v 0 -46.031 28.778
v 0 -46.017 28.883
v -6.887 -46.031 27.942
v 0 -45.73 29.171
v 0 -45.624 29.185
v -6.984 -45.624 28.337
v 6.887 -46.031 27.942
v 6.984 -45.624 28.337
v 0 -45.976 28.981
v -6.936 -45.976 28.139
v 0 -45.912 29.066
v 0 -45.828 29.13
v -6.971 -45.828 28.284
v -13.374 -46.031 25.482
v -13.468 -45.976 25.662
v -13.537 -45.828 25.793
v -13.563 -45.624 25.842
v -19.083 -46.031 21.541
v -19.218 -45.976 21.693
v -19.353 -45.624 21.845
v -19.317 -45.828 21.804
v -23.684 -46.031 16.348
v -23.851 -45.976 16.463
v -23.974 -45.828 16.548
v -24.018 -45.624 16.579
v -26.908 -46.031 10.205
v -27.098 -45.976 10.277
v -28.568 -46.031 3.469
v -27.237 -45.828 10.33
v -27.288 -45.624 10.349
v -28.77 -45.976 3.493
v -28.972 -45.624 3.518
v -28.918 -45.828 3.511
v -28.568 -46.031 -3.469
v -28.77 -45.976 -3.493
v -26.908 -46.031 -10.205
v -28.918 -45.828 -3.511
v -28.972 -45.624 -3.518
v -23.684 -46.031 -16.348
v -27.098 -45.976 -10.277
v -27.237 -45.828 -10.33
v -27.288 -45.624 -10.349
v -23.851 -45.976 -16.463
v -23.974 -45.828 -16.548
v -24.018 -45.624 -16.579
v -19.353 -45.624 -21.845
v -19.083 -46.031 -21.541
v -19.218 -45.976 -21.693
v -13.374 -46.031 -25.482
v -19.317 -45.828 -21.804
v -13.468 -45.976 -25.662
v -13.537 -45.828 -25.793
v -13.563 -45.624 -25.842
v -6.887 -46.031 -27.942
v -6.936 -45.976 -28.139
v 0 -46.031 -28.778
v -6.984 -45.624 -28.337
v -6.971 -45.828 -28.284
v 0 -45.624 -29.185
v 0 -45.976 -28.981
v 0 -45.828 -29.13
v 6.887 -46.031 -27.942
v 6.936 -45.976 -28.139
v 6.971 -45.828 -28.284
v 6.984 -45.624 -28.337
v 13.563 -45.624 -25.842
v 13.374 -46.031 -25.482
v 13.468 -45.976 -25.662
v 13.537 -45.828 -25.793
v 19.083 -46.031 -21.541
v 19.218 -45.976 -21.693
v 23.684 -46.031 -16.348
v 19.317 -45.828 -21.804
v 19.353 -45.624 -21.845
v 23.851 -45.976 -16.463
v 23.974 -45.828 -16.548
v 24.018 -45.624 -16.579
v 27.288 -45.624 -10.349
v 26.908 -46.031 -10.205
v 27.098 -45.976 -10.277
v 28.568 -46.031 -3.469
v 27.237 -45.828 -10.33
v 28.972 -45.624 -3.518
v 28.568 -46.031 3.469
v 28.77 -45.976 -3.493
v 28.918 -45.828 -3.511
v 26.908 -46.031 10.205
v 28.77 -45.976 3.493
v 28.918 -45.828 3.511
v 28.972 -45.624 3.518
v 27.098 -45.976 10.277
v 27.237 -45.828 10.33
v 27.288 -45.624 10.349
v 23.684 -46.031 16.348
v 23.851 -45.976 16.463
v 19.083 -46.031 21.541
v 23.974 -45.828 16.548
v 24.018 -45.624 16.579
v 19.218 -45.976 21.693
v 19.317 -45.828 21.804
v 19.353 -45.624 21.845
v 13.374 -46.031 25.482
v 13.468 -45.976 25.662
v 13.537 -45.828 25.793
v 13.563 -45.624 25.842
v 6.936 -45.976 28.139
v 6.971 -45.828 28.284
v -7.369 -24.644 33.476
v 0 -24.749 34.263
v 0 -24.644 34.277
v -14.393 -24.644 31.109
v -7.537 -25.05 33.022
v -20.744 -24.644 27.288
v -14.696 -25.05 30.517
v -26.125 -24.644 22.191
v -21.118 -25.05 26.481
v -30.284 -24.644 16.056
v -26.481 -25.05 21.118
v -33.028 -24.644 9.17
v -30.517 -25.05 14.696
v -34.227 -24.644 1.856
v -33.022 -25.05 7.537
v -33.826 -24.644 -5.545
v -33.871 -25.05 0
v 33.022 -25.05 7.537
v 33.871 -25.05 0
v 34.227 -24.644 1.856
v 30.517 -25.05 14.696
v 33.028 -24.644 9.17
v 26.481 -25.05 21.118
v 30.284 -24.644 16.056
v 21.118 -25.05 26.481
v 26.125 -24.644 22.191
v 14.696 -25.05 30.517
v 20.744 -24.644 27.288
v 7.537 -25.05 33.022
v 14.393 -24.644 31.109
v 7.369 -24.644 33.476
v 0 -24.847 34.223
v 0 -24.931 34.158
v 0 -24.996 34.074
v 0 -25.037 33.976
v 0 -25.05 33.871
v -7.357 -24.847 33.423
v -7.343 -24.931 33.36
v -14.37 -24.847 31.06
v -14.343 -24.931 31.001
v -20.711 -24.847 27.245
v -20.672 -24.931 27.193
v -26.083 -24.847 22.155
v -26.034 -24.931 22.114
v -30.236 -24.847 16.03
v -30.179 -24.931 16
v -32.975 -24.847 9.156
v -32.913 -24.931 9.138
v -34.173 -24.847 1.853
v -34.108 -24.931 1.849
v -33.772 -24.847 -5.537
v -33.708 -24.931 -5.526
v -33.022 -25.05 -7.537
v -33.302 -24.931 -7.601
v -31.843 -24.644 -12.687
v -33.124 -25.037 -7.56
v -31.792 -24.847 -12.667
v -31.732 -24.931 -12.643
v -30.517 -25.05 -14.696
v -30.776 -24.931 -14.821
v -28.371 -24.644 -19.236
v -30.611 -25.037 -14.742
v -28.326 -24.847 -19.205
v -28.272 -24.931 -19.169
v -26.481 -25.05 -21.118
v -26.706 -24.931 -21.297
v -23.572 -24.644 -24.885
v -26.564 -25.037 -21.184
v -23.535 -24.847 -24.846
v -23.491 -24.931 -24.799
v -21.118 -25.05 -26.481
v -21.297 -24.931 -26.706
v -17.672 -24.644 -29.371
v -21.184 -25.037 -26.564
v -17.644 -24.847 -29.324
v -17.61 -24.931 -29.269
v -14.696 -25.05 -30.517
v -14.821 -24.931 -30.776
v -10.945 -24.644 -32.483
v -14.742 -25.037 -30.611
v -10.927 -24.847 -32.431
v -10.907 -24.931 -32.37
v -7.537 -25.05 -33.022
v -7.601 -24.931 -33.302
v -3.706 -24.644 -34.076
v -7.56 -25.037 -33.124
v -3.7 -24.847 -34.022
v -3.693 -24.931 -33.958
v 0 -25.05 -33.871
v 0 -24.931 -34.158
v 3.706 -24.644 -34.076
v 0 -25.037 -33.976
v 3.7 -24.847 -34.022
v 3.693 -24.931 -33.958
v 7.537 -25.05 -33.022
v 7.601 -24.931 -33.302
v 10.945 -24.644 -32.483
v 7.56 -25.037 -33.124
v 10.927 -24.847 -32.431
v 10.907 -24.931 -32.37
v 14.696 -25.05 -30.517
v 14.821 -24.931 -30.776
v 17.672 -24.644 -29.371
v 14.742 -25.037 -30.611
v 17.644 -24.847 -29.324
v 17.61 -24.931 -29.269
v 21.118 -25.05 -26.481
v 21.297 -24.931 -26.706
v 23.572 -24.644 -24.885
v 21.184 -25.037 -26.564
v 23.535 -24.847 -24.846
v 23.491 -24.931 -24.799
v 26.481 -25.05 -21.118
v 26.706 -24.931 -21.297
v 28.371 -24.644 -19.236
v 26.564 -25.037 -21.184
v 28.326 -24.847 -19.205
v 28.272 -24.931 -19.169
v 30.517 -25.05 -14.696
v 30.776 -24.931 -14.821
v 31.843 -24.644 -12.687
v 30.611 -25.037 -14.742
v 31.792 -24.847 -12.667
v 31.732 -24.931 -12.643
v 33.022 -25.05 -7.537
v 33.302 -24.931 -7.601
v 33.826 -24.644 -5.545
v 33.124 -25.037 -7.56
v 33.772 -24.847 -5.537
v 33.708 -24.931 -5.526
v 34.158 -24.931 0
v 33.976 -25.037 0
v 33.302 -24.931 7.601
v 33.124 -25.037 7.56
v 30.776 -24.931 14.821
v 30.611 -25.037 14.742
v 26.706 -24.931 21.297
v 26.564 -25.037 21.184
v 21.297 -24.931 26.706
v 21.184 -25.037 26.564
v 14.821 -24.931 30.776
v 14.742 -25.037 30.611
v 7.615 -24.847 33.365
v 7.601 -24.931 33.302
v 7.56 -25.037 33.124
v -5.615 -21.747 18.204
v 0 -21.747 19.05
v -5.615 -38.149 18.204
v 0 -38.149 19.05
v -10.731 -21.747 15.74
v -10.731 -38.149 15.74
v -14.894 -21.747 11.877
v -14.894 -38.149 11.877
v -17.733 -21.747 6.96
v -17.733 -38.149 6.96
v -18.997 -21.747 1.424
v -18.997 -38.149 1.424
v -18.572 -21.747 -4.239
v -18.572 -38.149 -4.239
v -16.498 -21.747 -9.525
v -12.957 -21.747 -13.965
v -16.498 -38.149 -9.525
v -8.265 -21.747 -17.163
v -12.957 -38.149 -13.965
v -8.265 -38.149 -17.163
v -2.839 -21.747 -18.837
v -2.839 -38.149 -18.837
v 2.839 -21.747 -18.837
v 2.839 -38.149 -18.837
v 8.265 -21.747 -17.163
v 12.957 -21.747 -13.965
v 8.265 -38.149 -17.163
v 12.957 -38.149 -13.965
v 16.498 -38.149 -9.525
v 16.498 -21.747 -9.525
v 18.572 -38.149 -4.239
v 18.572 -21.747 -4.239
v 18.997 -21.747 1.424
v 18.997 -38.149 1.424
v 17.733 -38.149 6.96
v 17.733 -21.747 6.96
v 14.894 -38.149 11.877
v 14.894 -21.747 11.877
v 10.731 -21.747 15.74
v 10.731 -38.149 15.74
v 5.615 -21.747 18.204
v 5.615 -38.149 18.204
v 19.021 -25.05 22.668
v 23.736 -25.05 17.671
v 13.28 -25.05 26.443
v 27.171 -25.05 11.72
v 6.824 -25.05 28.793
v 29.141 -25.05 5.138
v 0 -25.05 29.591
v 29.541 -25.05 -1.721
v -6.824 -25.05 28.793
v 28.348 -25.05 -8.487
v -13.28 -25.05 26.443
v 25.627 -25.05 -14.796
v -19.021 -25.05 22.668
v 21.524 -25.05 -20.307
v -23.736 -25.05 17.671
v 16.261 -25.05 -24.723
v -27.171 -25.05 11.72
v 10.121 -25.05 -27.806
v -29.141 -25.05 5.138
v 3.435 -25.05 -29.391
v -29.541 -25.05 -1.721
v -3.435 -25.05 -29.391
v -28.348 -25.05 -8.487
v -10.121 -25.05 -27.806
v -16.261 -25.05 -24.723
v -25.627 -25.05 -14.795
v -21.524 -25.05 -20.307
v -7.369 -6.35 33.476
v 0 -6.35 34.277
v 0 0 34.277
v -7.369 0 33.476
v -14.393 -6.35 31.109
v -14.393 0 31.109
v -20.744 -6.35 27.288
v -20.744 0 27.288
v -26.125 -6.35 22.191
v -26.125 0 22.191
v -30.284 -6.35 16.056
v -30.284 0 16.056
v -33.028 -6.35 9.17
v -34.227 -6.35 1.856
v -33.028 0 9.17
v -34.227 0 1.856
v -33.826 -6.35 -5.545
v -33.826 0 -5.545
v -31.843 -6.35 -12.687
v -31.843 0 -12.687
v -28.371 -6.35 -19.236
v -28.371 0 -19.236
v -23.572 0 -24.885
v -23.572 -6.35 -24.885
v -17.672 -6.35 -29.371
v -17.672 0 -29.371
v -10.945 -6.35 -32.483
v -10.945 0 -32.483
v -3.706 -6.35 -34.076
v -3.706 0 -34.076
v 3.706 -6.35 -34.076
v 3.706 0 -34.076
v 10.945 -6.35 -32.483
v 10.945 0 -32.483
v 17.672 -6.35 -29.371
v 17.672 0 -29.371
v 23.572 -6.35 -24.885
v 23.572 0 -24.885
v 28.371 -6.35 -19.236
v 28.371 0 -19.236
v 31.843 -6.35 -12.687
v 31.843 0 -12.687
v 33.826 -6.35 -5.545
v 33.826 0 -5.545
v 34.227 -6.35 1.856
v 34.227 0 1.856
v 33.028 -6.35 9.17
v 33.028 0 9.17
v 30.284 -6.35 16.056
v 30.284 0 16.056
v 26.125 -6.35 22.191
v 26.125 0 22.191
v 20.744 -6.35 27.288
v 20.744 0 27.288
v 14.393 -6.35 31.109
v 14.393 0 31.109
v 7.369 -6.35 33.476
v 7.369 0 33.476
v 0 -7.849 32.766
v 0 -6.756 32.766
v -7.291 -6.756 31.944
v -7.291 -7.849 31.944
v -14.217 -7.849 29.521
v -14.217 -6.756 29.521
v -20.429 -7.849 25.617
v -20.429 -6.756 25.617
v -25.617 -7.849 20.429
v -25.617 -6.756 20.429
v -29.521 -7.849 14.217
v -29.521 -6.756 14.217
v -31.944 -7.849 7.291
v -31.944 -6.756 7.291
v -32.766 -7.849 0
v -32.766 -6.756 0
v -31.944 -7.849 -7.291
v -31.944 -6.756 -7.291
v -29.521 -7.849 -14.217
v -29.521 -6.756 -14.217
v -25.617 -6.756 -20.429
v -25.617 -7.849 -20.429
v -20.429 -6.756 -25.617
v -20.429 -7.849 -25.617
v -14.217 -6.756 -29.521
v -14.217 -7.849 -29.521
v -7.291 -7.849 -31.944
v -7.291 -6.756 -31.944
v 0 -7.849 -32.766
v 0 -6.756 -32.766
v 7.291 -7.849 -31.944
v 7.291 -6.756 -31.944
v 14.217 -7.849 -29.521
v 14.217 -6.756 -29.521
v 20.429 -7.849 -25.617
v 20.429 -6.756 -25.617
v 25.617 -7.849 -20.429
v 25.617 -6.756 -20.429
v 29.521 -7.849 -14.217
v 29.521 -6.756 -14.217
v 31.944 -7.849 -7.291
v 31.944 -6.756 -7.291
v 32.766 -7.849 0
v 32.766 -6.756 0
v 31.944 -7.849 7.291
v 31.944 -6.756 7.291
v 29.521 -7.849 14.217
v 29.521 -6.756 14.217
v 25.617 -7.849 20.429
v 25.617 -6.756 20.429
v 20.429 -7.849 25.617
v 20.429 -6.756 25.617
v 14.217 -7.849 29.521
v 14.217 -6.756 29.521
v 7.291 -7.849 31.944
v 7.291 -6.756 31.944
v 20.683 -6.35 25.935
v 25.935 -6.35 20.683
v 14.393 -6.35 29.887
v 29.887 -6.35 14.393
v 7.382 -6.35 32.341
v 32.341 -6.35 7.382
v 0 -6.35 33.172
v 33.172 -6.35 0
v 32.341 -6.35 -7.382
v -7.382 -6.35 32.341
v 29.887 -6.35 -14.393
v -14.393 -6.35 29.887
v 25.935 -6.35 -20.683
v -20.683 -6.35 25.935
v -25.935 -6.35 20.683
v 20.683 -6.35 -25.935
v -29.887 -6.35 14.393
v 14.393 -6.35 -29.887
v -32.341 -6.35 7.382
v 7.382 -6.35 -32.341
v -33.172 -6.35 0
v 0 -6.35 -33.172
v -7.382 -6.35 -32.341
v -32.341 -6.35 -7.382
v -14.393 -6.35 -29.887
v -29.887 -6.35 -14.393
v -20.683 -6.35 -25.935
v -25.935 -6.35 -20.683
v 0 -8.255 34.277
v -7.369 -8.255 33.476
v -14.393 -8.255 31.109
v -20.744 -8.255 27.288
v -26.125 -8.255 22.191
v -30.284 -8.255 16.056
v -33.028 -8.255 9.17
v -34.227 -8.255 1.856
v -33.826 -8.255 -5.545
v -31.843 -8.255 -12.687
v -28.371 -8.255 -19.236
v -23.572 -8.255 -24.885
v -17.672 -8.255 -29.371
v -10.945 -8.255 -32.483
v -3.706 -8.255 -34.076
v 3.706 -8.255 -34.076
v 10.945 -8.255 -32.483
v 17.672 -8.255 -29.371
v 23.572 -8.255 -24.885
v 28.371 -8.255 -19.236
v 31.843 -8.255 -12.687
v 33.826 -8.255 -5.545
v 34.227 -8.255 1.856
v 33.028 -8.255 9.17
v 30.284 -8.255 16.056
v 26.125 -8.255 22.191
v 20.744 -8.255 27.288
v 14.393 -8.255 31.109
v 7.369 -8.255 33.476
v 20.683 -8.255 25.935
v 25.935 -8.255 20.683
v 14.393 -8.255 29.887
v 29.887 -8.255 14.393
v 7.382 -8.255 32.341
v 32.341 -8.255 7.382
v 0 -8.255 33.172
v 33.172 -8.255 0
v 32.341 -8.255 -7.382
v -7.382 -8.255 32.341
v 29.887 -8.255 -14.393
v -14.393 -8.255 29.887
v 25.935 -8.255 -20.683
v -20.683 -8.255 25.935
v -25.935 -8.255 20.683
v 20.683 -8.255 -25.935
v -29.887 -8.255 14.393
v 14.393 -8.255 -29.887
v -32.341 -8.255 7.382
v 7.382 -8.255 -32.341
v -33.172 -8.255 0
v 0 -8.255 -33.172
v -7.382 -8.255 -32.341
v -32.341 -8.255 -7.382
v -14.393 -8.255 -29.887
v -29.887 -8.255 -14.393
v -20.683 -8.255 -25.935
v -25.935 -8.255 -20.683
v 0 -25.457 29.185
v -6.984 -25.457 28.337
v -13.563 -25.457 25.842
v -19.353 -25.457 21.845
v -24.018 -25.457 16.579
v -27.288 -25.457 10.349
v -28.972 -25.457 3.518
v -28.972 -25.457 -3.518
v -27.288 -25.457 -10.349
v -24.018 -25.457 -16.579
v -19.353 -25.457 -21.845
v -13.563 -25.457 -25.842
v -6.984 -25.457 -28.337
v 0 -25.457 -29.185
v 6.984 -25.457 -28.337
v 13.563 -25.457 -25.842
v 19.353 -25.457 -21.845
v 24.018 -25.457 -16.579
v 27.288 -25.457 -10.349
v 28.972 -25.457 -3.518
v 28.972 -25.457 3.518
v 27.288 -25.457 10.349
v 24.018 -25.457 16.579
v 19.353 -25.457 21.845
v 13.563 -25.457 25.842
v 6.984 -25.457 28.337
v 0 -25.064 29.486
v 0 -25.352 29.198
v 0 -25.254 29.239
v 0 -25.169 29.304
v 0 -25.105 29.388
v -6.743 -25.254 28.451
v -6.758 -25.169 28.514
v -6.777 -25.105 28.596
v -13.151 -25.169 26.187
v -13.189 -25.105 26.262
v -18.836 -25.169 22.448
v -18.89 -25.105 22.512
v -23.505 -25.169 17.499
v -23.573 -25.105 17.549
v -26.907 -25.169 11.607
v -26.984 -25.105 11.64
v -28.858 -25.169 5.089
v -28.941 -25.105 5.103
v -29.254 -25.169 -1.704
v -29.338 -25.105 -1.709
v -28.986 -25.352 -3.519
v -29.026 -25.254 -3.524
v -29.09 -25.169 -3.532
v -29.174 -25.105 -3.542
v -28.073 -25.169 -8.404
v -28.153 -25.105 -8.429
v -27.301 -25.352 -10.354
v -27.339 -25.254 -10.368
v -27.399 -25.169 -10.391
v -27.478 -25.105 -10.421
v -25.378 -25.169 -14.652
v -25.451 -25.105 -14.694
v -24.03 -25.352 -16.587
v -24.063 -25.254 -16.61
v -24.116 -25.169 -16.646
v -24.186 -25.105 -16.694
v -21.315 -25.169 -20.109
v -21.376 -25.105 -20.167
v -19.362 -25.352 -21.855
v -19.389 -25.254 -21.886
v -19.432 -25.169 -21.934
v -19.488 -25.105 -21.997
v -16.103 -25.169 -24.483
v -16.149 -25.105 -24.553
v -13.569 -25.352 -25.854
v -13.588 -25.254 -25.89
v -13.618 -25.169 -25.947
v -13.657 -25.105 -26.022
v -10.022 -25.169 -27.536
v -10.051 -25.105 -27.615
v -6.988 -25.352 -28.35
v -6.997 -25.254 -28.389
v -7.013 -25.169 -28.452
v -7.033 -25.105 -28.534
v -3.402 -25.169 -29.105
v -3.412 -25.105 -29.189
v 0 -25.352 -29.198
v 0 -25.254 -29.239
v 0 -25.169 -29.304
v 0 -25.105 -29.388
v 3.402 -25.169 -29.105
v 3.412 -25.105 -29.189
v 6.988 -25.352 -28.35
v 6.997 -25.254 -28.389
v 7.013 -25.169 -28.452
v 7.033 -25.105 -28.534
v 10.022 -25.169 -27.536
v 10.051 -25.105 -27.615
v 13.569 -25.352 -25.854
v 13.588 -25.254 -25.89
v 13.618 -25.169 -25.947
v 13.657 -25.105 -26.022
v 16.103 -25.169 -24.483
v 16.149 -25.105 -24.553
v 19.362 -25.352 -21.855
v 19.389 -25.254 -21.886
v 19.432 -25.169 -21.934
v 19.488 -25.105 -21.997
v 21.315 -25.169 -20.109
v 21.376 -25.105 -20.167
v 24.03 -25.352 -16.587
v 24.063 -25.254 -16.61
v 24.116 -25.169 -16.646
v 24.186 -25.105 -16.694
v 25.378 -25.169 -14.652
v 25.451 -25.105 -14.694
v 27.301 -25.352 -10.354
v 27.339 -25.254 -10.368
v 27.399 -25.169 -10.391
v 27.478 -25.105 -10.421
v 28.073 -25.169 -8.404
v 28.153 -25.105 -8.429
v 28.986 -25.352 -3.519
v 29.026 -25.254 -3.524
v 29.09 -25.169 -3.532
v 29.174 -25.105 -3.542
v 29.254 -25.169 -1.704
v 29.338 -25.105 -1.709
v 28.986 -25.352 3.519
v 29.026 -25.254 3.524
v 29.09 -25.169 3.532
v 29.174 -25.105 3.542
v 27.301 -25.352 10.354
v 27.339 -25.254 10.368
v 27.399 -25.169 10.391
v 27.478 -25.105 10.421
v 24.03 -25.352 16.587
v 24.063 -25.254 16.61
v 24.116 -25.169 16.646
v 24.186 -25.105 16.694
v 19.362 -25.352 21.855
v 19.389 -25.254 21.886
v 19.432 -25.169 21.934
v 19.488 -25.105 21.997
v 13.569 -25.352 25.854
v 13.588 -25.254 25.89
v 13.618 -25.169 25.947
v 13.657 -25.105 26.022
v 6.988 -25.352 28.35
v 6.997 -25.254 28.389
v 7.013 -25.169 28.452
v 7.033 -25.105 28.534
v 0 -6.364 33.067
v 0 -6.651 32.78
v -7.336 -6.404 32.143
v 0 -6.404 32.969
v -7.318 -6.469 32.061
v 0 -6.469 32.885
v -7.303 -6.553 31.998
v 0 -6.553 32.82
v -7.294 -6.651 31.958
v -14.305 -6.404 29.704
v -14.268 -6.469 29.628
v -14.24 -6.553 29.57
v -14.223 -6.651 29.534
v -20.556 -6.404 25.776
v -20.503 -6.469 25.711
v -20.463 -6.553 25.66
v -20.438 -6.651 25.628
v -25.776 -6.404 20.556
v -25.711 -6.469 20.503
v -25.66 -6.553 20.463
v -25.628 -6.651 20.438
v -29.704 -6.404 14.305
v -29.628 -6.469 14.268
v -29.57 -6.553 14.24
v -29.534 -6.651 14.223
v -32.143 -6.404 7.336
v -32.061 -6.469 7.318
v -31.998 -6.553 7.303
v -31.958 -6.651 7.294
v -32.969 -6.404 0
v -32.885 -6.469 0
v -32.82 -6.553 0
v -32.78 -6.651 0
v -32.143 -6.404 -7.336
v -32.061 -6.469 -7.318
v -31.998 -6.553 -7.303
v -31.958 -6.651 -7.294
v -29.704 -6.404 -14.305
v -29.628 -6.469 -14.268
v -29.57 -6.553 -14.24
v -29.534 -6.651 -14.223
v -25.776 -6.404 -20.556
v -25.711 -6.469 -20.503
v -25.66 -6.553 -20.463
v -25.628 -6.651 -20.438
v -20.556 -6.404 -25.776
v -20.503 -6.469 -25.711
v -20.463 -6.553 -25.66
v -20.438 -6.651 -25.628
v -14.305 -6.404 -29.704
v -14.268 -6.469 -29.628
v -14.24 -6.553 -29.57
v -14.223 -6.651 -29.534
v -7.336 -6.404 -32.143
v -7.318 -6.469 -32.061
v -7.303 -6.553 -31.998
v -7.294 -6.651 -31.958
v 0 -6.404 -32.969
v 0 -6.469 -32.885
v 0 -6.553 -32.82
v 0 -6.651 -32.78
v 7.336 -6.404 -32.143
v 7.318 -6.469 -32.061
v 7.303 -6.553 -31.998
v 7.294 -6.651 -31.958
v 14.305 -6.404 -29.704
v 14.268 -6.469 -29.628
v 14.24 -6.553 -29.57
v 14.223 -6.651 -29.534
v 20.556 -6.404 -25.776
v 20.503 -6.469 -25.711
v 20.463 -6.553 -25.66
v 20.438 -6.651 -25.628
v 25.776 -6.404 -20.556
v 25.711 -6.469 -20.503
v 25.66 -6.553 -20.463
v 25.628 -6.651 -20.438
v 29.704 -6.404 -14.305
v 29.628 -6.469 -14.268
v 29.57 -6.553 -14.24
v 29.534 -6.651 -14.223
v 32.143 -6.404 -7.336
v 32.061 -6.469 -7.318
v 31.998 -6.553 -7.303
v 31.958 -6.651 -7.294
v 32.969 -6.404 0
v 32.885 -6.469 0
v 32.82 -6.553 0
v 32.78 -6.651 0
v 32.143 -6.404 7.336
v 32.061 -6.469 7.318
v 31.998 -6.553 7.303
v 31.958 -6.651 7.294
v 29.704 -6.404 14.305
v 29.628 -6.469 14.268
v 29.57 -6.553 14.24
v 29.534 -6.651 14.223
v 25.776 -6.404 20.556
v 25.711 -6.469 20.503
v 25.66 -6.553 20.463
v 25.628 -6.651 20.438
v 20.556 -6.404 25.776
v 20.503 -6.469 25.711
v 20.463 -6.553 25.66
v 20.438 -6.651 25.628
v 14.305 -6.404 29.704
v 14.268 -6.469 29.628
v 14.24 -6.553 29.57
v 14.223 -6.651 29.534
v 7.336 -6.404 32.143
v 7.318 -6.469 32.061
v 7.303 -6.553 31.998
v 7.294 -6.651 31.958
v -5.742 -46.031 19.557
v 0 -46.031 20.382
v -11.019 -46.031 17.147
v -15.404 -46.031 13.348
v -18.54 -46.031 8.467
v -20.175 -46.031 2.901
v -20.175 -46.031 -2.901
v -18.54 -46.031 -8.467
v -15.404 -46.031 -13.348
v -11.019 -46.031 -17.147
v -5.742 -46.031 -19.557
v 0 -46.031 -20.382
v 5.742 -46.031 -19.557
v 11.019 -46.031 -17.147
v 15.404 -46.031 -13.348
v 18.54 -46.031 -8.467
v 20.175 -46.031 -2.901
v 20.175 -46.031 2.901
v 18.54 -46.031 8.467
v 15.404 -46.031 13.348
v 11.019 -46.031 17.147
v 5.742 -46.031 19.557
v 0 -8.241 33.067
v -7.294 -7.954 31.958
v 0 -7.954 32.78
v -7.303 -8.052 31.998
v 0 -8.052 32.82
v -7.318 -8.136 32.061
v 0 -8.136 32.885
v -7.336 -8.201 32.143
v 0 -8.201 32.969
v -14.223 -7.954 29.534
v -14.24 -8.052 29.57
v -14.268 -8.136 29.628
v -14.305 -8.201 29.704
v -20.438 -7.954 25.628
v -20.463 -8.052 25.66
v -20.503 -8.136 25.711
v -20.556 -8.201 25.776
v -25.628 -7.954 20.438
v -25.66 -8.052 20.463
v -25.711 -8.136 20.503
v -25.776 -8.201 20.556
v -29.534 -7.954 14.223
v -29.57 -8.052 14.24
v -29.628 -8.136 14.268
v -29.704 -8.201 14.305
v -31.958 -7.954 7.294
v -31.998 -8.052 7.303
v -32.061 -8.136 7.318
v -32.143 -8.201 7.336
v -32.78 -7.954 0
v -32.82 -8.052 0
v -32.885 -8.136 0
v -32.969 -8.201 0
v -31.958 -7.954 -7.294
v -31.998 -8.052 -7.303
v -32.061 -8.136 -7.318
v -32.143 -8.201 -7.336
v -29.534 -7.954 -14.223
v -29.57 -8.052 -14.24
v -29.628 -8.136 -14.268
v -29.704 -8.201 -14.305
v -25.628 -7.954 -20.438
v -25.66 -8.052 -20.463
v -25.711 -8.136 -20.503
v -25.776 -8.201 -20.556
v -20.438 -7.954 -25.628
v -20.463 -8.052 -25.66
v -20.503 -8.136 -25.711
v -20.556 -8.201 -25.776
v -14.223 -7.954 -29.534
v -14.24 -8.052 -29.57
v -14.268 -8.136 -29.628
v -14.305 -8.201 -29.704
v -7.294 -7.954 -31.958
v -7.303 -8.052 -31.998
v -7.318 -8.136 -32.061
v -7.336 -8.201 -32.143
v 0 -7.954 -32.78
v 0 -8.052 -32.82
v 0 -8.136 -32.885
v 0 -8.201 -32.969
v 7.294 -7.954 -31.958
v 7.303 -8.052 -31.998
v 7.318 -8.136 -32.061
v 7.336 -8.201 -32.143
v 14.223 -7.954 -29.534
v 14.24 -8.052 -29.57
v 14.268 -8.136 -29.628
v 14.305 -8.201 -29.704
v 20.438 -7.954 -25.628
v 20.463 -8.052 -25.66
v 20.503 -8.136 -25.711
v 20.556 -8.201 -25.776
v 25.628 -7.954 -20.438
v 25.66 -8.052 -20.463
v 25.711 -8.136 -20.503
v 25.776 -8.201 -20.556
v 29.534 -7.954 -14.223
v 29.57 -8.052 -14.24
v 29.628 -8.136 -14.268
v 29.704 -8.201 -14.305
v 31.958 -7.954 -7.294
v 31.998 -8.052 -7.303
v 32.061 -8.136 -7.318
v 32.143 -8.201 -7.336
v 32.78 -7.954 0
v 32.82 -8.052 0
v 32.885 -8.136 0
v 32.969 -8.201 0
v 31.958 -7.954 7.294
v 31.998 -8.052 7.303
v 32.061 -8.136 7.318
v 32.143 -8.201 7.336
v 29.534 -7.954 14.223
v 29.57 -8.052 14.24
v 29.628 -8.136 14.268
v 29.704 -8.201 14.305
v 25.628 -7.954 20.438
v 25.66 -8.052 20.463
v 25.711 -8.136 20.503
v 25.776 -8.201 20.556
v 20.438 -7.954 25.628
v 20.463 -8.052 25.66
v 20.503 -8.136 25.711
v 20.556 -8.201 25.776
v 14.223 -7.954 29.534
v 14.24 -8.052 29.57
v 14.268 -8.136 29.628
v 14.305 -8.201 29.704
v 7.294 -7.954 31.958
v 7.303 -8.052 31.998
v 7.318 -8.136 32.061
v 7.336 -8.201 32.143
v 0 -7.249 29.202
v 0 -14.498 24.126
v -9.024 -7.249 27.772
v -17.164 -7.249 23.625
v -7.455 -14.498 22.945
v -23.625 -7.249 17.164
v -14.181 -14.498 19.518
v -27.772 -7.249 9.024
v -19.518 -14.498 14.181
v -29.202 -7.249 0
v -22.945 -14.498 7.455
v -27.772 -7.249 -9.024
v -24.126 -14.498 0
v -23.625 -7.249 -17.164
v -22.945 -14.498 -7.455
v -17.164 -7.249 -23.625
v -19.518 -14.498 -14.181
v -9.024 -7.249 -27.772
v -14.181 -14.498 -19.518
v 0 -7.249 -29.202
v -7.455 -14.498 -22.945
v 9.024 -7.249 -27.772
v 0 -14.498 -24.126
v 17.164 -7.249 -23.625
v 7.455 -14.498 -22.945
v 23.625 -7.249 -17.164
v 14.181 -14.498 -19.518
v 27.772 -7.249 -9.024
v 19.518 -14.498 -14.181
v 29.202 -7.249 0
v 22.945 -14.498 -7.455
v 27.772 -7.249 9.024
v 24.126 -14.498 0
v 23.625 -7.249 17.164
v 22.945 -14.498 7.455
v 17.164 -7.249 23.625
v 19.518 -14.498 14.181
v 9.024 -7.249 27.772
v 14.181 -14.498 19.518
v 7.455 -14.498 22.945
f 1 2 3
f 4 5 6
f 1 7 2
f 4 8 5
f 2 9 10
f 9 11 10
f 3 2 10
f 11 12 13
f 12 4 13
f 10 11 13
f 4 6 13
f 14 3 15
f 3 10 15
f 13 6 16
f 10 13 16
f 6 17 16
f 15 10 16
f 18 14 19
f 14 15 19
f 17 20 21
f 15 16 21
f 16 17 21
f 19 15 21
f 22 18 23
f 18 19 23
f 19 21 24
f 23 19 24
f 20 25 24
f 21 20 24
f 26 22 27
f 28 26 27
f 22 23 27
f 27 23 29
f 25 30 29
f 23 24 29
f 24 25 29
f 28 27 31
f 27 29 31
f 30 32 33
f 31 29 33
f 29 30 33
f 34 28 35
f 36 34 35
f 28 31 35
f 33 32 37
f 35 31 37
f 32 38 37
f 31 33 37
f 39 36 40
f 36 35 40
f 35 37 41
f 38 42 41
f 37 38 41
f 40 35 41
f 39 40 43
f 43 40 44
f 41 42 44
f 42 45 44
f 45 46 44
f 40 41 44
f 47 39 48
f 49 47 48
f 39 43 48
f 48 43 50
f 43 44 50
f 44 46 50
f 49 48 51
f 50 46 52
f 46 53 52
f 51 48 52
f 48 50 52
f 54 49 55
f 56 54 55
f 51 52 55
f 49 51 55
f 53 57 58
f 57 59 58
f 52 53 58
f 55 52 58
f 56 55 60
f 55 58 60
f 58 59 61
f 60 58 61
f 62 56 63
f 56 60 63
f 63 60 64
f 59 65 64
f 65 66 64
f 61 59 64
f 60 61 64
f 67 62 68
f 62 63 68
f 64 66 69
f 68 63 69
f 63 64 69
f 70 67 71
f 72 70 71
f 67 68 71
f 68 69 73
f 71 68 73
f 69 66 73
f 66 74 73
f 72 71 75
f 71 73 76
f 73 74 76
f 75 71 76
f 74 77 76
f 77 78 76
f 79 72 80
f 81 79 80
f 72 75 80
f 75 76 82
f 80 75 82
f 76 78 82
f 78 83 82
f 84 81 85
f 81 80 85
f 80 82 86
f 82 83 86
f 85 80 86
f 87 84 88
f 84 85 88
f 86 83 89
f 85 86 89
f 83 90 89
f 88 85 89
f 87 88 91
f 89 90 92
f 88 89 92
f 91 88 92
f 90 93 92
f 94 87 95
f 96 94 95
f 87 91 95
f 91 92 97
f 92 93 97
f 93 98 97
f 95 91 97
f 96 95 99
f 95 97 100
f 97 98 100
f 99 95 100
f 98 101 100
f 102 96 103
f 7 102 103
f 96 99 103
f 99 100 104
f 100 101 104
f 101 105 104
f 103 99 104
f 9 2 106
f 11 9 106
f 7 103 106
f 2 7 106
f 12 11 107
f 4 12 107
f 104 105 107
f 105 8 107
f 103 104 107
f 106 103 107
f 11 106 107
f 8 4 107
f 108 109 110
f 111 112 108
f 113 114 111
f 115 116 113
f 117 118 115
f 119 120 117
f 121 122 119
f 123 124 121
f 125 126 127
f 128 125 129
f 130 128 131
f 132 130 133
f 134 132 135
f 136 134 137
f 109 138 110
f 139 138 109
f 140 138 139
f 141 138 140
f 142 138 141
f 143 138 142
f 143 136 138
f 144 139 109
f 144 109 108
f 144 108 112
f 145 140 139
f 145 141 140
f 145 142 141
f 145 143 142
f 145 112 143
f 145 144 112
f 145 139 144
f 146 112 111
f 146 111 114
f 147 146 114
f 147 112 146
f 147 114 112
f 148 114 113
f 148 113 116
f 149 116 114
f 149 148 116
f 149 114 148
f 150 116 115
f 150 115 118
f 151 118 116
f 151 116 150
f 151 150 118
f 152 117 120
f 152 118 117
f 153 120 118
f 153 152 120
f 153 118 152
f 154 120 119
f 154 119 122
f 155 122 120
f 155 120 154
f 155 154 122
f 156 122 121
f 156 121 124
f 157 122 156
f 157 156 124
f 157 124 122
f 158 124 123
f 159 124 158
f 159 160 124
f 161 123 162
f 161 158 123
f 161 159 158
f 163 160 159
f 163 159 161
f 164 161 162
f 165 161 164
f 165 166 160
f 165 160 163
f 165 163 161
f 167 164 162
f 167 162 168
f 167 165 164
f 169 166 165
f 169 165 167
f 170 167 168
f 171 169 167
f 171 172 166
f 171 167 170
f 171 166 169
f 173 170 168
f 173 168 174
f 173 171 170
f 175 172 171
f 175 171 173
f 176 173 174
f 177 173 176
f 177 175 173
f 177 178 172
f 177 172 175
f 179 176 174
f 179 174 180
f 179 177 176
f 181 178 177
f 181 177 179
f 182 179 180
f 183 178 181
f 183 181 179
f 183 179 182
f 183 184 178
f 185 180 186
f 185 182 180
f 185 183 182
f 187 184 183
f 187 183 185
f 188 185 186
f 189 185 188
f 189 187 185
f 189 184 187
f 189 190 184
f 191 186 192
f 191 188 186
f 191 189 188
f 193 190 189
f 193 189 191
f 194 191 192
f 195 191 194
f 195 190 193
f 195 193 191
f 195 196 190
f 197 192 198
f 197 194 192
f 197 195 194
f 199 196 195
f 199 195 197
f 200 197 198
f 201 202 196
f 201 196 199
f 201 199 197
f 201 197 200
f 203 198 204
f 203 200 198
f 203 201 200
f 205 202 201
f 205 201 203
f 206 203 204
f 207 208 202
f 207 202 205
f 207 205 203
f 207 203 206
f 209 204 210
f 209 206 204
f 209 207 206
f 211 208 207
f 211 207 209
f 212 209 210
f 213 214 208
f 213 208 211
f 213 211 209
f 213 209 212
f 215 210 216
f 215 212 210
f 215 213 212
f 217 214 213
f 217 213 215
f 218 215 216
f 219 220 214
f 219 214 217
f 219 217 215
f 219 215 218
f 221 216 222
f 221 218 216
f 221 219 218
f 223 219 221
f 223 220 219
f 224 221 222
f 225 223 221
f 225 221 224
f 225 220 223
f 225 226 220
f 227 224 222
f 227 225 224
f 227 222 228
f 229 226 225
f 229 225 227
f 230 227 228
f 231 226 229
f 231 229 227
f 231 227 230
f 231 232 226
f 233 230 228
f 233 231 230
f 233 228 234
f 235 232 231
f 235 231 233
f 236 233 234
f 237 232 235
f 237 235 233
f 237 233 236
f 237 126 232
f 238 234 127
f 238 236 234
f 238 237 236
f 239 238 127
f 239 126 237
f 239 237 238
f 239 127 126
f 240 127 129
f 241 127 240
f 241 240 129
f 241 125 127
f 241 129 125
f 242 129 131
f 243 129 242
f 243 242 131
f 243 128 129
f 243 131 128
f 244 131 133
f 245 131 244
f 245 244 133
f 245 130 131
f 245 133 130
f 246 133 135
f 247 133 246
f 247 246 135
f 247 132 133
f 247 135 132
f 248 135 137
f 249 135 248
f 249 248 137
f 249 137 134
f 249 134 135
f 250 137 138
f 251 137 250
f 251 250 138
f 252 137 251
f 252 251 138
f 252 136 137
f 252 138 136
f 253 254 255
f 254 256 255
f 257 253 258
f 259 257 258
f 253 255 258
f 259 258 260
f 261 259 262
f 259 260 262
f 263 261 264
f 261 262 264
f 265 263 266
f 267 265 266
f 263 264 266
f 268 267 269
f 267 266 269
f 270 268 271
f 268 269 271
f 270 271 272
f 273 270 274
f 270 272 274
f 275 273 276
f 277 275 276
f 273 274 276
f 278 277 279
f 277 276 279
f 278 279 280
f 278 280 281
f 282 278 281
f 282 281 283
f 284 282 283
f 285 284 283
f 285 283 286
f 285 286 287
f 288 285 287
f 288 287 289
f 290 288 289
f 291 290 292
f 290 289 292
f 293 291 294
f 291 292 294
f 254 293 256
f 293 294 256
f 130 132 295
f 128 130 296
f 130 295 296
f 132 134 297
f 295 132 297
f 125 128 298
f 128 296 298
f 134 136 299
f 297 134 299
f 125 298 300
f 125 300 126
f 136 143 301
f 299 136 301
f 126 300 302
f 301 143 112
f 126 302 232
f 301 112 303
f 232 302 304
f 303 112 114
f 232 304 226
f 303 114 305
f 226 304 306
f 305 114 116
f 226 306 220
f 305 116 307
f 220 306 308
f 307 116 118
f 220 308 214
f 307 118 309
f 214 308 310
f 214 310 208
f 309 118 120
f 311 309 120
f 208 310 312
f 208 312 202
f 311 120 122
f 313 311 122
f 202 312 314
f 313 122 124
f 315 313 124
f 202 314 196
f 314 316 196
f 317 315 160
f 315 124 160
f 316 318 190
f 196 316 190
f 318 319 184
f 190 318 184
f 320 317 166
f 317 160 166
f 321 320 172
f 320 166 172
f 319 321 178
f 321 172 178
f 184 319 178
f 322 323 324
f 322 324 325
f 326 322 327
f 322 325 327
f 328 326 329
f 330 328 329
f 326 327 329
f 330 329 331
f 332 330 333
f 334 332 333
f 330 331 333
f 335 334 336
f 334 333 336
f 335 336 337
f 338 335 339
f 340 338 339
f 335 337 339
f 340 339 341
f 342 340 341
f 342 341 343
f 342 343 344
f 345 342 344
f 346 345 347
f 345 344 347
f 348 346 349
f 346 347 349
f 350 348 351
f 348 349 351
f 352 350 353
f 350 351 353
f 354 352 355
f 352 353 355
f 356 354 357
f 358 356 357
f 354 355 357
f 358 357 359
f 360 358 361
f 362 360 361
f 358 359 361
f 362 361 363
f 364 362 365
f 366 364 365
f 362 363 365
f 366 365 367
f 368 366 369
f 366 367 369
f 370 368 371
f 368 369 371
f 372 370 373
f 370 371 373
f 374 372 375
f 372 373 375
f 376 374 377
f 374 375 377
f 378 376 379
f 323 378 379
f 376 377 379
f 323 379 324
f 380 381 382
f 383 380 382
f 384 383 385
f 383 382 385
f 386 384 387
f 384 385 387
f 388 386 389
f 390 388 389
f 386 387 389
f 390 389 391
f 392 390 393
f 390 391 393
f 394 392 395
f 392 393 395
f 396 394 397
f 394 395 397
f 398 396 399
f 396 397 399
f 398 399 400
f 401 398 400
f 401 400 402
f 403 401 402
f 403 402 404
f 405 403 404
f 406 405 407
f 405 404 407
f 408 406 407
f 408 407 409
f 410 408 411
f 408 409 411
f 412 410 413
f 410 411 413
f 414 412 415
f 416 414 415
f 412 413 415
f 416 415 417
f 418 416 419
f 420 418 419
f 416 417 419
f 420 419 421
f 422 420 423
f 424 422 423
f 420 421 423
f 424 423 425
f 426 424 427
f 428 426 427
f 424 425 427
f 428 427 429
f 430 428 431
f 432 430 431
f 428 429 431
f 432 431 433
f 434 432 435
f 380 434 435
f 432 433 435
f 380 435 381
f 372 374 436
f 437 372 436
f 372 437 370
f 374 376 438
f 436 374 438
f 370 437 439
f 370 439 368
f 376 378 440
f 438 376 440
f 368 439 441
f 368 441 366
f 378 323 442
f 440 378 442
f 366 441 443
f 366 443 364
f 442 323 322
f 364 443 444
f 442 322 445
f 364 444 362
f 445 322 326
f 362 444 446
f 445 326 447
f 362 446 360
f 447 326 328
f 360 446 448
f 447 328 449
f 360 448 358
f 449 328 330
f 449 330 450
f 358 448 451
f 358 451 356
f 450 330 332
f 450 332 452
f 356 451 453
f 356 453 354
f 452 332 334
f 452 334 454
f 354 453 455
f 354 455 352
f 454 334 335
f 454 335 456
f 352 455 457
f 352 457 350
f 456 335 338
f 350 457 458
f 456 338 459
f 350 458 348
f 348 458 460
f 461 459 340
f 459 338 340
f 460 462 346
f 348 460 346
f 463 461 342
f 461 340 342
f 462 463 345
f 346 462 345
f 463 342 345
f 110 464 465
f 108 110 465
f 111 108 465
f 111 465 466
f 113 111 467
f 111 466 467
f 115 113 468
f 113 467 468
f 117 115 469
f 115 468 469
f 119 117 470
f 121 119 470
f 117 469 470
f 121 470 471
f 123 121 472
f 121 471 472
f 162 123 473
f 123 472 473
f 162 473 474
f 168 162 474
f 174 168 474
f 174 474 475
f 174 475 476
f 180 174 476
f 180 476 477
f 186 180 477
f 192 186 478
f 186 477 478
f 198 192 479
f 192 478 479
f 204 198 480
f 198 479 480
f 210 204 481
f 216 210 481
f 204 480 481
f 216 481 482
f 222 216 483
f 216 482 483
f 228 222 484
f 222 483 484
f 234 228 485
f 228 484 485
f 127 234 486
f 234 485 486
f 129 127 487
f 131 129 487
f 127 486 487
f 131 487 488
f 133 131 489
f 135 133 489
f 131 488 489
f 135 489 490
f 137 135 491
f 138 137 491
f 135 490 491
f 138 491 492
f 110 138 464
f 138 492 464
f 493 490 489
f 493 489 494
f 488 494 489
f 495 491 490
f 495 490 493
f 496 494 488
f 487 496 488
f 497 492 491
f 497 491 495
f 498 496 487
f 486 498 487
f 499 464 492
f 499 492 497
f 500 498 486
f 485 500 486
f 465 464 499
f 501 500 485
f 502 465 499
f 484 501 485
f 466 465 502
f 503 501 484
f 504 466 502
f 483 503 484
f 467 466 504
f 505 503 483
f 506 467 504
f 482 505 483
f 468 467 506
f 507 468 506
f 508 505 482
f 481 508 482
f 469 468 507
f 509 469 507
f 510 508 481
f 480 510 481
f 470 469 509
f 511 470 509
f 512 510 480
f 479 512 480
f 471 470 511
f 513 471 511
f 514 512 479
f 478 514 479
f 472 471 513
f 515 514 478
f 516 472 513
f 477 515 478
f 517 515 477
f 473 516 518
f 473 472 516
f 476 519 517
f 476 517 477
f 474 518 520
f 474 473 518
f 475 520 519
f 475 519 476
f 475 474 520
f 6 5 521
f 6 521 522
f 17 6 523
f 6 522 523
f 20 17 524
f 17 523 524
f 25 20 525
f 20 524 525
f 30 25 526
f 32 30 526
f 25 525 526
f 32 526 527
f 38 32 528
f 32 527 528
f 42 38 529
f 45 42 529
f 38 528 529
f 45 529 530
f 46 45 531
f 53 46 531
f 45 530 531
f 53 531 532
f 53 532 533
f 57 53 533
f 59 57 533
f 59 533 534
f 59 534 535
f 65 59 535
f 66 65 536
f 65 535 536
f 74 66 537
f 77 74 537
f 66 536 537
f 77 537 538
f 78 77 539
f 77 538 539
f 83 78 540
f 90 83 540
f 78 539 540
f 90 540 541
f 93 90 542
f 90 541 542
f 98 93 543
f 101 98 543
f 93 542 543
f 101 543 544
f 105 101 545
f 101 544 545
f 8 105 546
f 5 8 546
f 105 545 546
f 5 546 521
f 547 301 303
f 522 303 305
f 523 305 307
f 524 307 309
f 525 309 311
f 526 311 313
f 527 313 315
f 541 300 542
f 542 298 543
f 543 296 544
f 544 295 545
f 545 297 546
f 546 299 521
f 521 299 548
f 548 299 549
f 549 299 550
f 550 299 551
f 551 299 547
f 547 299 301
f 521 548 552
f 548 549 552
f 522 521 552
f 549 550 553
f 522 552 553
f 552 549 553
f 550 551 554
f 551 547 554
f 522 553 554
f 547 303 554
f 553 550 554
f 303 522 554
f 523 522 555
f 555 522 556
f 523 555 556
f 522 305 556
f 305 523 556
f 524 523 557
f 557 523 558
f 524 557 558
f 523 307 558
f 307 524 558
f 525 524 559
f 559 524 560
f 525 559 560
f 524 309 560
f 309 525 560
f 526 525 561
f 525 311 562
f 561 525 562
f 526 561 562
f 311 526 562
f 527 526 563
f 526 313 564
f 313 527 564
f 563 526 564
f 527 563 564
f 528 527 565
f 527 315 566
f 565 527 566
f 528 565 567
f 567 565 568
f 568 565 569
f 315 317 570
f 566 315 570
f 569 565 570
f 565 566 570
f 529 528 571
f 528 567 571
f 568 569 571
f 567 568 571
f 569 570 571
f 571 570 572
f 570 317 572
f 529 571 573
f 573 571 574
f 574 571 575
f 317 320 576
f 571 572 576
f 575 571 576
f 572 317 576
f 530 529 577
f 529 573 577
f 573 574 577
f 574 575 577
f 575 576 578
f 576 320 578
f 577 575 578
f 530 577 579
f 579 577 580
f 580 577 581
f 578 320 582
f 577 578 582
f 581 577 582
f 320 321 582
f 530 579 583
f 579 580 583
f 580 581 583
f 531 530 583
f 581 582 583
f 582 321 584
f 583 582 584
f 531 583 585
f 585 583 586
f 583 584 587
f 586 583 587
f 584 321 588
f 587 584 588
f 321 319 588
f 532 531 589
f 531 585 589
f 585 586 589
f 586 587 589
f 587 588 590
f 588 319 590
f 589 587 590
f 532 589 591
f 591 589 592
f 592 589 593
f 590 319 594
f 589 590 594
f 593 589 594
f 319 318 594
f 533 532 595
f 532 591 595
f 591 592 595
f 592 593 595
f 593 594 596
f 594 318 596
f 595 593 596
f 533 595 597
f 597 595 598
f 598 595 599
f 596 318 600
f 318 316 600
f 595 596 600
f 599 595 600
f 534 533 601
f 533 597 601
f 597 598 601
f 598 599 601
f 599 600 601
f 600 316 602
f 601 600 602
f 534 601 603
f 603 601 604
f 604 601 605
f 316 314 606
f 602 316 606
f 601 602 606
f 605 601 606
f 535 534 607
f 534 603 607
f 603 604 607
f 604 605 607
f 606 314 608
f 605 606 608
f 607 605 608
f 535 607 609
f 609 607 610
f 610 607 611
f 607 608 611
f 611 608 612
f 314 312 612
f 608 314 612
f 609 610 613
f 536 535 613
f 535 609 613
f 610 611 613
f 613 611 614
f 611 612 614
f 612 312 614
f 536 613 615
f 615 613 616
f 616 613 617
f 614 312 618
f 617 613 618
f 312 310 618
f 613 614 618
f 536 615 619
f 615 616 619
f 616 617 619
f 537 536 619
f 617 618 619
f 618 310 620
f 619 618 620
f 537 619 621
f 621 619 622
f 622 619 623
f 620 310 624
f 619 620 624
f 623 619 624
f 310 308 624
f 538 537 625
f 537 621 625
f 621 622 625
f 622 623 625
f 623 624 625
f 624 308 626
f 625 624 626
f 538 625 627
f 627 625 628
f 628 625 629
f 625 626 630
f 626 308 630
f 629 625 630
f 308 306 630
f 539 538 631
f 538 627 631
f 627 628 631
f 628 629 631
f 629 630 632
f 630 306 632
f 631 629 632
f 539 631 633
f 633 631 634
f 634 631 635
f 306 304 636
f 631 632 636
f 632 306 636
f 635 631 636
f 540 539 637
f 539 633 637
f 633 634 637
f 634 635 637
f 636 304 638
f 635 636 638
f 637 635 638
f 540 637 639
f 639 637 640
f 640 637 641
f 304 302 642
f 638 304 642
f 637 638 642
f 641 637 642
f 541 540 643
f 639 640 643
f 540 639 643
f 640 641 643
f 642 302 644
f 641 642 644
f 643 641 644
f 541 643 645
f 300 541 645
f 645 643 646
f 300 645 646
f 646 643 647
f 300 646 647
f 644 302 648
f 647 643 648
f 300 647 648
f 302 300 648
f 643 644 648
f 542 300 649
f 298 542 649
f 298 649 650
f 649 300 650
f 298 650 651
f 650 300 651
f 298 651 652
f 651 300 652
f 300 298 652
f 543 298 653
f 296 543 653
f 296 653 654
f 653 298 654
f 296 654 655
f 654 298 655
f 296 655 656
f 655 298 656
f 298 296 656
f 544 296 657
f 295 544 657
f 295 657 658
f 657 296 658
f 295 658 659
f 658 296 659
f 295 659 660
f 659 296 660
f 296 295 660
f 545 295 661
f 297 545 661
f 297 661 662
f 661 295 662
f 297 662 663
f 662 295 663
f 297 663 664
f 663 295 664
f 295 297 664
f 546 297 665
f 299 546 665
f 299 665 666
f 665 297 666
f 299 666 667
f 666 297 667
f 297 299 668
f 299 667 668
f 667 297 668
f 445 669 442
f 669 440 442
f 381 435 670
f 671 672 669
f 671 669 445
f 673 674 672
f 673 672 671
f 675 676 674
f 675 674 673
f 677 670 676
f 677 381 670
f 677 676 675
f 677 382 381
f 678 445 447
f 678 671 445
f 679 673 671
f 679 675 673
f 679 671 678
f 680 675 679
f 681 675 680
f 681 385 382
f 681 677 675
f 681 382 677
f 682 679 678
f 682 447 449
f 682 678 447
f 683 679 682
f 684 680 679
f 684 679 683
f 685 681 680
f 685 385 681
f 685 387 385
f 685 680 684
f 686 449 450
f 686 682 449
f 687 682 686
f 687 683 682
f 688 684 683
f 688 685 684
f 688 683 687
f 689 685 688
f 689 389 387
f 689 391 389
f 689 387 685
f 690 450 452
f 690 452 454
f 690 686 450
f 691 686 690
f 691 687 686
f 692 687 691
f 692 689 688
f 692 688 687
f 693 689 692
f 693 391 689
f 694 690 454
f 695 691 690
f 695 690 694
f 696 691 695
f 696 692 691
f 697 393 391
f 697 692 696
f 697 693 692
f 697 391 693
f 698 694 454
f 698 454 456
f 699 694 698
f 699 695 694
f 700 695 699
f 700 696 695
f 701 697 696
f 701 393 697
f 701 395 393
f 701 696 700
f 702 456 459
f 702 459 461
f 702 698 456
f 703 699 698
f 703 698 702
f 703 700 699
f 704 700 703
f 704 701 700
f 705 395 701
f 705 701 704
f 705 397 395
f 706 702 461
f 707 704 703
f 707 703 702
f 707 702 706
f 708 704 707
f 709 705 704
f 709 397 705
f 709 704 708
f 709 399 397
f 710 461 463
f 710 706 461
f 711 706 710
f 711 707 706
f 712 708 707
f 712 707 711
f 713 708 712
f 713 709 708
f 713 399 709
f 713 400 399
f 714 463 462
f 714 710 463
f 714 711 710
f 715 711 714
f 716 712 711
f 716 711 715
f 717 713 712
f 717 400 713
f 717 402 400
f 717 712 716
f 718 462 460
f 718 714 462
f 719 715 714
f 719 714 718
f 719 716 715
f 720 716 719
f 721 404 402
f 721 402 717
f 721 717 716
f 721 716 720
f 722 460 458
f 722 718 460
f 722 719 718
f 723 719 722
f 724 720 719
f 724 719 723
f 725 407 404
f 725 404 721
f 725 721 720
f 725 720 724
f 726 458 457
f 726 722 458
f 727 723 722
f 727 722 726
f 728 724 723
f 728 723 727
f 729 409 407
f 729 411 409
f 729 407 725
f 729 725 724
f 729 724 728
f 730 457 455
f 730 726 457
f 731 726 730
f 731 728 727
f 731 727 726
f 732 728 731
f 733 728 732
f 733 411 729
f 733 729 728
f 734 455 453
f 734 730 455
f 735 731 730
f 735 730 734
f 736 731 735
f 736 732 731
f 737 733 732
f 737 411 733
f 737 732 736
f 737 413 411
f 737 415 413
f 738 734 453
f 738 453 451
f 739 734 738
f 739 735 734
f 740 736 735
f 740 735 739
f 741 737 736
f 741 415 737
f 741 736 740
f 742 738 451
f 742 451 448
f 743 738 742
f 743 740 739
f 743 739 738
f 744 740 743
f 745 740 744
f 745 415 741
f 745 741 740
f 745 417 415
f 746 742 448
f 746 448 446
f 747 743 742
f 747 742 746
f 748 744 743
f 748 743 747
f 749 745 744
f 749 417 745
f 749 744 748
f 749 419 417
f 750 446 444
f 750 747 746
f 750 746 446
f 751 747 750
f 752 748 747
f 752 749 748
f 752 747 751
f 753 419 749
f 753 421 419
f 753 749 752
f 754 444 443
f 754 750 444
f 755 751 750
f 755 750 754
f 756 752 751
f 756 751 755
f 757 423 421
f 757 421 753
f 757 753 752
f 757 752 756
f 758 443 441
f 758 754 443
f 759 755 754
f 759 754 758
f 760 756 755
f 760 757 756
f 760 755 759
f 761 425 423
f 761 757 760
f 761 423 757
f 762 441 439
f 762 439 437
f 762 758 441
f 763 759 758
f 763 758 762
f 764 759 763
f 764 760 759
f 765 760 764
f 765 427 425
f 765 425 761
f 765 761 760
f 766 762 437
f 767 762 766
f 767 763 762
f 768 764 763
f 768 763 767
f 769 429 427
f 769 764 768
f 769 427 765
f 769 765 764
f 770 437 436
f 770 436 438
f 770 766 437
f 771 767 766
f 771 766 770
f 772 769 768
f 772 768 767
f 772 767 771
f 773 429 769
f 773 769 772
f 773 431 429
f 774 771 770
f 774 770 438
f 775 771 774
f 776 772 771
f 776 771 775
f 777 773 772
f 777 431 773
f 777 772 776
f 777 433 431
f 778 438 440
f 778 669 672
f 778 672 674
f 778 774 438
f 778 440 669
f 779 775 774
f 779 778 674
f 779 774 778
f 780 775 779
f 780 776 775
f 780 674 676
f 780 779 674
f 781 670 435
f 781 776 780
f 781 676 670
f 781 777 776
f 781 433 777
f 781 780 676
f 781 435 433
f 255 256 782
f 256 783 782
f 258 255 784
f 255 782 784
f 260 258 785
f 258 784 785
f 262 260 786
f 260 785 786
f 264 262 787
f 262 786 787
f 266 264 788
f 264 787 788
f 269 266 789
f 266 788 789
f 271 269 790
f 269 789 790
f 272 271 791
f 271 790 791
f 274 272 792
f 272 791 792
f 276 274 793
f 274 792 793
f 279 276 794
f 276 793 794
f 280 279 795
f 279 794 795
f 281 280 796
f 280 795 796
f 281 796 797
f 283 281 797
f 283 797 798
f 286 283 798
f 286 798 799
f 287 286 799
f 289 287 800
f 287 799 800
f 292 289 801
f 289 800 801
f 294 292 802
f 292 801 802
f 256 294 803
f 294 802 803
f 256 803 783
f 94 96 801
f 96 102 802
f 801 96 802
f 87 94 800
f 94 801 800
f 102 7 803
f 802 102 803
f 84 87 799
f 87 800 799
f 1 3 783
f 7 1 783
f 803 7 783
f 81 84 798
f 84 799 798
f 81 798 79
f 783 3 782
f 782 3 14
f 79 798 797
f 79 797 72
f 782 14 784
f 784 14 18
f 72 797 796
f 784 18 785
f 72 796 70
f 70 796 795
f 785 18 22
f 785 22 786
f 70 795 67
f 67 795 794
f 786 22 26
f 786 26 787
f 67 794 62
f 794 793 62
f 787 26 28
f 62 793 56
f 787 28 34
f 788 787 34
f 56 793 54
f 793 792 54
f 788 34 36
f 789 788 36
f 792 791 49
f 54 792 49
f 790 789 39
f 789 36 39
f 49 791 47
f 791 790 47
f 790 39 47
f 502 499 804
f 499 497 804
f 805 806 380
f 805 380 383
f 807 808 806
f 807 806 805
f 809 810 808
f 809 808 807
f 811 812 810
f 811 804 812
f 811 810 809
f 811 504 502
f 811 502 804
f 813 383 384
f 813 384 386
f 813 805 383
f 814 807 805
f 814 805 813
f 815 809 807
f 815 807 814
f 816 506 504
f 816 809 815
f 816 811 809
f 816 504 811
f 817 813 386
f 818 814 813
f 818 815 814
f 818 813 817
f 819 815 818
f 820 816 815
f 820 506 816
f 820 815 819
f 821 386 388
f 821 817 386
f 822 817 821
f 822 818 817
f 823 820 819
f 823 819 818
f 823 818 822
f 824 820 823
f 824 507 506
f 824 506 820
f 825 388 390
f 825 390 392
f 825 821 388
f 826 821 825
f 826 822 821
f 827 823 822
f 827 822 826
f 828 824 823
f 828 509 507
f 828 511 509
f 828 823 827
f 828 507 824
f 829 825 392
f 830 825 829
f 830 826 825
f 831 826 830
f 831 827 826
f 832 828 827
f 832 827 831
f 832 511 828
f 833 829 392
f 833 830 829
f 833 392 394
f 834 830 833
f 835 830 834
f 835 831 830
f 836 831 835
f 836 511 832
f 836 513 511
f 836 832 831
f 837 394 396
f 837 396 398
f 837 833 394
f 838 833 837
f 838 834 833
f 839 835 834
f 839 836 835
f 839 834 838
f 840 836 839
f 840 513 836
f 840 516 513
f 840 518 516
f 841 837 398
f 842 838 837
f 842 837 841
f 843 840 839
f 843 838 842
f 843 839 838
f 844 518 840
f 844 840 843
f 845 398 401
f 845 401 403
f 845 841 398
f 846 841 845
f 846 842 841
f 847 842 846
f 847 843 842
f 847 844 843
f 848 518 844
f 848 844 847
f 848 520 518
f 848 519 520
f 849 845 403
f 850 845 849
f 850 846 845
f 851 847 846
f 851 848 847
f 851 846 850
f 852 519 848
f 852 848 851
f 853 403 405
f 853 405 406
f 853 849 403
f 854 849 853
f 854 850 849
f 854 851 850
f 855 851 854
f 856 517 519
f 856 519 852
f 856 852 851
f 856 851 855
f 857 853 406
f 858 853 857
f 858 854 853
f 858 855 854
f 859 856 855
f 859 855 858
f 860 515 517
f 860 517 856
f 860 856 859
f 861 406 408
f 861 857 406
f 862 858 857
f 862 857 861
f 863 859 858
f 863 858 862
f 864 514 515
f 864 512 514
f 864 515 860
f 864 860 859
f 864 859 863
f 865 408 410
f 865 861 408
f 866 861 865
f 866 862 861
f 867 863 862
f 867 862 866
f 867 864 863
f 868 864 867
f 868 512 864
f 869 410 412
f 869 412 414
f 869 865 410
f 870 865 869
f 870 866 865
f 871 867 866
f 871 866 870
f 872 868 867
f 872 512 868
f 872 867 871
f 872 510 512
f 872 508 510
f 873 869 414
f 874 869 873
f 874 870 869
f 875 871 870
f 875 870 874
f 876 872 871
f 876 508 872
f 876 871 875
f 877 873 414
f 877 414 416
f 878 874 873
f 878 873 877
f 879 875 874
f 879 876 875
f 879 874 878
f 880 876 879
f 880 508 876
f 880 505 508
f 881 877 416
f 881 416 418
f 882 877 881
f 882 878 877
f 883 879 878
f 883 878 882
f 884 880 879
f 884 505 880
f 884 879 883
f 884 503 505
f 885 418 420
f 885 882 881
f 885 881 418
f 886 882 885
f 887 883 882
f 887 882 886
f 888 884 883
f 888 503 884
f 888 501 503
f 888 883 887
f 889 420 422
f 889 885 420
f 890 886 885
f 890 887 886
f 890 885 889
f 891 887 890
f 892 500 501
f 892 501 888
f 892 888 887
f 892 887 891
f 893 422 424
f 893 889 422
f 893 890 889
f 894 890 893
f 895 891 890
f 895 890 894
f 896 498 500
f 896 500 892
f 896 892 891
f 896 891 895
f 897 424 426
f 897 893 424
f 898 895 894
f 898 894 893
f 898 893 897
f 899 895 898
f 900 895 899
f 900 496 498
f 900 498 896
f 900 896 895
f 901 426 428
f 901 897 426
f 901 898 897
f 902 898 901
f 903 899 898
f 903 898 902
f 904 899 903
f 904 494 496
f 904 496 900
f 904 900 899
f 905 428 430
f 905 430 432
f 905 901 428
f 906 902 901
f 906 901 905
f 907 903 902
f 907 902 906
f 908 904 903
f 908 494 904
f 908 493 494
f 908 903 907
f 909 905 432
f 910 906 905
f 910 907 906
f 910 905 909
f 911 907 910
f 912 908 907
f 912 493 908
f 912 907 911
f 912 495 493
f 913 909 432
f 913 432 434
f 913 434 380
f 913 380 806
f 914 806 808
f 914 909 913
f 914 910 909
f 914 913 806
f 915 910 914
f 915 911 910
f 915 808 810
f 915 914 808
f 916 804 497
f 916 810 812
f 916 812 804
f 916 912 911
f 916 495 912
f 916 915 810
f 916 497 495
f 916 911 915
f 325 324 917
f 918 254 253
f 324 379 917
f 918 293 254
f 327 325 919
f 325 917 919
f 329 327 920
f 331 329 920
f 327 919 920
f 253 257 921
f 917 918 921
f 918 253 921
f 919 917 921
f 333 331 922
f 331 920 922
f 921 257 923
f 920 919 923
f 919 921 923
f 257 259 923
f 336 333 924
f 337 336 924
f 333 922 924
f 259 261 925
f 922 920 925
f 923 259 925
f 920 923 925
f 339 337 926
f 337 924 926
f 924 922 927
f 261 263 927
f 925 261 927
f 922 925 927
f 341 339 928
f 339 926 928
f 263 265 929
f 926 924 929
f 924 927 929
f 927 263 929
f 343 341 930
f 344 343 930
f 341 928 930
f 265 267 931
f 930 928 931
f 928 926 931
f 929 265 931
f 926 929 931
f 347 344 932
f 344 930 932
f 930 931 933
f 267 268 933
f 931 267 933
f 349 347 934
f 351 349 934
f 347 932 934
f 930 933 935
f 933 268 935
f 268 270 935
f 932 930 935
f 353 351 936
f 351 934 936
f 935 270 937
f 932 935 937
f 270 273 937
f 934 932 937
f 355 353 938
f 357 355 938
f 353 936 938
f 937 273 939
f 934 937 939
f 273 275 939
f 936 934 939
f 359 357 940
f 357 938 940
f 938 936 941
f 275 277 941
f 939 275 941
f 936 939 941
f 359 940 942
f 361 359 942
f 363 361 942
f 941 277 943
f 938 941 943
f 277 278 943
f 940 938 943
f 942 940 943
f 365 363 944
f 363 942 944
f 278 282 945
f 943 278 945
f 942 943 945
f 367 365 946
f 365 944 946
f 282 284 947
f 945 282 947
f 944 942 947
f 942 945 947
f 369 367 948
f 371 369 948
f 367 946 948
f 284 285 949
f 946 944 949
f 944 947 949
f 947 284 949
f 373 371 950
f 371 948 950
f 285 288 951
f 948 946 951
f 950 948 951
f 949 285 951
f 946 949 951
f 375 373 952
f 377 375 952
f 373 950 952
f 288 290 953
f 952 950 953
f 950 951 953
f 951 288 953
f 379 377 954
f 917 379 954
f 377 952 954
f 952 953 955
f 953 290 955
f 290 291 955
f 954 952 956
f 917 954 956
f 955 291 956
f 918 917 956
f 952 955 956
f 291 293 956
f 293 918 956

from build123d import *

# Parameters (mm, degrees)
SKETCH6_W     = 1.5113
SKETCH6_H     = 1.905
TOOL_RADIUS_R = 0.4064


with BuildPart() as part:
    # Sketch4 → Revolve1 (revolve)
    with BuildSketch(Plane(origin=(0, 0, 0), x_dir=(0, 0, -1), z_dir=(1, 0, 0)), mode=Mode.PRIVATE) as revolve1_sk:
        Polygon((34.2773, 0), (19.05, -21.746838143), (19.05, -38.149257502), (20.382233443, -46.030856842), (29.1846, -46.030856842), (29.1846, -25.050456842), (34.2773, -25.050456842), align=None)
    revolve(revolve1_sk.sketch.rotate(Axis((0, 0, 0), (0, -1, 0)), 180), axis=Axis((0, 0, 0), (0, -1, 0)))

    # Sketch6 → Spring Groove (revolve, cut)
    with BuildSketch(Plane(origin=(0, 0, 0), x_dir=(0, 0, -1), z_dir=(1, 0, 0)), mode=Mode.PRIVATE) as spring_groove_sk:
        with Locations((33.52165, -7.3025)):
            Rectangle(SKETCH6_W, SKETCH6_H)
    revolve(spring_groove_sk.sketch.rotate(Axis((0, 11.364369063, 0), (0, -1, 0)), 180), axis=Axis((0, 11.364369063, 0), (0, -1, 0)), mode=Mode.SUBTRACT)

    # Tool Radius
    tool_radius_edges = [part.edges().sort_by_distance(p)[0] for p in [
        (0, -6.35, -32.766),
        (0, -8.255, -32.766),
        (0, -46.030856842, -29.1846),
        (0, -25.050456842, -29.1846),
        (0, -25.050456842, -34.2773),
    ]]
    fillet(tool_radius_edges, radius=TOOL_RADIUS_R)


solid = part.part
